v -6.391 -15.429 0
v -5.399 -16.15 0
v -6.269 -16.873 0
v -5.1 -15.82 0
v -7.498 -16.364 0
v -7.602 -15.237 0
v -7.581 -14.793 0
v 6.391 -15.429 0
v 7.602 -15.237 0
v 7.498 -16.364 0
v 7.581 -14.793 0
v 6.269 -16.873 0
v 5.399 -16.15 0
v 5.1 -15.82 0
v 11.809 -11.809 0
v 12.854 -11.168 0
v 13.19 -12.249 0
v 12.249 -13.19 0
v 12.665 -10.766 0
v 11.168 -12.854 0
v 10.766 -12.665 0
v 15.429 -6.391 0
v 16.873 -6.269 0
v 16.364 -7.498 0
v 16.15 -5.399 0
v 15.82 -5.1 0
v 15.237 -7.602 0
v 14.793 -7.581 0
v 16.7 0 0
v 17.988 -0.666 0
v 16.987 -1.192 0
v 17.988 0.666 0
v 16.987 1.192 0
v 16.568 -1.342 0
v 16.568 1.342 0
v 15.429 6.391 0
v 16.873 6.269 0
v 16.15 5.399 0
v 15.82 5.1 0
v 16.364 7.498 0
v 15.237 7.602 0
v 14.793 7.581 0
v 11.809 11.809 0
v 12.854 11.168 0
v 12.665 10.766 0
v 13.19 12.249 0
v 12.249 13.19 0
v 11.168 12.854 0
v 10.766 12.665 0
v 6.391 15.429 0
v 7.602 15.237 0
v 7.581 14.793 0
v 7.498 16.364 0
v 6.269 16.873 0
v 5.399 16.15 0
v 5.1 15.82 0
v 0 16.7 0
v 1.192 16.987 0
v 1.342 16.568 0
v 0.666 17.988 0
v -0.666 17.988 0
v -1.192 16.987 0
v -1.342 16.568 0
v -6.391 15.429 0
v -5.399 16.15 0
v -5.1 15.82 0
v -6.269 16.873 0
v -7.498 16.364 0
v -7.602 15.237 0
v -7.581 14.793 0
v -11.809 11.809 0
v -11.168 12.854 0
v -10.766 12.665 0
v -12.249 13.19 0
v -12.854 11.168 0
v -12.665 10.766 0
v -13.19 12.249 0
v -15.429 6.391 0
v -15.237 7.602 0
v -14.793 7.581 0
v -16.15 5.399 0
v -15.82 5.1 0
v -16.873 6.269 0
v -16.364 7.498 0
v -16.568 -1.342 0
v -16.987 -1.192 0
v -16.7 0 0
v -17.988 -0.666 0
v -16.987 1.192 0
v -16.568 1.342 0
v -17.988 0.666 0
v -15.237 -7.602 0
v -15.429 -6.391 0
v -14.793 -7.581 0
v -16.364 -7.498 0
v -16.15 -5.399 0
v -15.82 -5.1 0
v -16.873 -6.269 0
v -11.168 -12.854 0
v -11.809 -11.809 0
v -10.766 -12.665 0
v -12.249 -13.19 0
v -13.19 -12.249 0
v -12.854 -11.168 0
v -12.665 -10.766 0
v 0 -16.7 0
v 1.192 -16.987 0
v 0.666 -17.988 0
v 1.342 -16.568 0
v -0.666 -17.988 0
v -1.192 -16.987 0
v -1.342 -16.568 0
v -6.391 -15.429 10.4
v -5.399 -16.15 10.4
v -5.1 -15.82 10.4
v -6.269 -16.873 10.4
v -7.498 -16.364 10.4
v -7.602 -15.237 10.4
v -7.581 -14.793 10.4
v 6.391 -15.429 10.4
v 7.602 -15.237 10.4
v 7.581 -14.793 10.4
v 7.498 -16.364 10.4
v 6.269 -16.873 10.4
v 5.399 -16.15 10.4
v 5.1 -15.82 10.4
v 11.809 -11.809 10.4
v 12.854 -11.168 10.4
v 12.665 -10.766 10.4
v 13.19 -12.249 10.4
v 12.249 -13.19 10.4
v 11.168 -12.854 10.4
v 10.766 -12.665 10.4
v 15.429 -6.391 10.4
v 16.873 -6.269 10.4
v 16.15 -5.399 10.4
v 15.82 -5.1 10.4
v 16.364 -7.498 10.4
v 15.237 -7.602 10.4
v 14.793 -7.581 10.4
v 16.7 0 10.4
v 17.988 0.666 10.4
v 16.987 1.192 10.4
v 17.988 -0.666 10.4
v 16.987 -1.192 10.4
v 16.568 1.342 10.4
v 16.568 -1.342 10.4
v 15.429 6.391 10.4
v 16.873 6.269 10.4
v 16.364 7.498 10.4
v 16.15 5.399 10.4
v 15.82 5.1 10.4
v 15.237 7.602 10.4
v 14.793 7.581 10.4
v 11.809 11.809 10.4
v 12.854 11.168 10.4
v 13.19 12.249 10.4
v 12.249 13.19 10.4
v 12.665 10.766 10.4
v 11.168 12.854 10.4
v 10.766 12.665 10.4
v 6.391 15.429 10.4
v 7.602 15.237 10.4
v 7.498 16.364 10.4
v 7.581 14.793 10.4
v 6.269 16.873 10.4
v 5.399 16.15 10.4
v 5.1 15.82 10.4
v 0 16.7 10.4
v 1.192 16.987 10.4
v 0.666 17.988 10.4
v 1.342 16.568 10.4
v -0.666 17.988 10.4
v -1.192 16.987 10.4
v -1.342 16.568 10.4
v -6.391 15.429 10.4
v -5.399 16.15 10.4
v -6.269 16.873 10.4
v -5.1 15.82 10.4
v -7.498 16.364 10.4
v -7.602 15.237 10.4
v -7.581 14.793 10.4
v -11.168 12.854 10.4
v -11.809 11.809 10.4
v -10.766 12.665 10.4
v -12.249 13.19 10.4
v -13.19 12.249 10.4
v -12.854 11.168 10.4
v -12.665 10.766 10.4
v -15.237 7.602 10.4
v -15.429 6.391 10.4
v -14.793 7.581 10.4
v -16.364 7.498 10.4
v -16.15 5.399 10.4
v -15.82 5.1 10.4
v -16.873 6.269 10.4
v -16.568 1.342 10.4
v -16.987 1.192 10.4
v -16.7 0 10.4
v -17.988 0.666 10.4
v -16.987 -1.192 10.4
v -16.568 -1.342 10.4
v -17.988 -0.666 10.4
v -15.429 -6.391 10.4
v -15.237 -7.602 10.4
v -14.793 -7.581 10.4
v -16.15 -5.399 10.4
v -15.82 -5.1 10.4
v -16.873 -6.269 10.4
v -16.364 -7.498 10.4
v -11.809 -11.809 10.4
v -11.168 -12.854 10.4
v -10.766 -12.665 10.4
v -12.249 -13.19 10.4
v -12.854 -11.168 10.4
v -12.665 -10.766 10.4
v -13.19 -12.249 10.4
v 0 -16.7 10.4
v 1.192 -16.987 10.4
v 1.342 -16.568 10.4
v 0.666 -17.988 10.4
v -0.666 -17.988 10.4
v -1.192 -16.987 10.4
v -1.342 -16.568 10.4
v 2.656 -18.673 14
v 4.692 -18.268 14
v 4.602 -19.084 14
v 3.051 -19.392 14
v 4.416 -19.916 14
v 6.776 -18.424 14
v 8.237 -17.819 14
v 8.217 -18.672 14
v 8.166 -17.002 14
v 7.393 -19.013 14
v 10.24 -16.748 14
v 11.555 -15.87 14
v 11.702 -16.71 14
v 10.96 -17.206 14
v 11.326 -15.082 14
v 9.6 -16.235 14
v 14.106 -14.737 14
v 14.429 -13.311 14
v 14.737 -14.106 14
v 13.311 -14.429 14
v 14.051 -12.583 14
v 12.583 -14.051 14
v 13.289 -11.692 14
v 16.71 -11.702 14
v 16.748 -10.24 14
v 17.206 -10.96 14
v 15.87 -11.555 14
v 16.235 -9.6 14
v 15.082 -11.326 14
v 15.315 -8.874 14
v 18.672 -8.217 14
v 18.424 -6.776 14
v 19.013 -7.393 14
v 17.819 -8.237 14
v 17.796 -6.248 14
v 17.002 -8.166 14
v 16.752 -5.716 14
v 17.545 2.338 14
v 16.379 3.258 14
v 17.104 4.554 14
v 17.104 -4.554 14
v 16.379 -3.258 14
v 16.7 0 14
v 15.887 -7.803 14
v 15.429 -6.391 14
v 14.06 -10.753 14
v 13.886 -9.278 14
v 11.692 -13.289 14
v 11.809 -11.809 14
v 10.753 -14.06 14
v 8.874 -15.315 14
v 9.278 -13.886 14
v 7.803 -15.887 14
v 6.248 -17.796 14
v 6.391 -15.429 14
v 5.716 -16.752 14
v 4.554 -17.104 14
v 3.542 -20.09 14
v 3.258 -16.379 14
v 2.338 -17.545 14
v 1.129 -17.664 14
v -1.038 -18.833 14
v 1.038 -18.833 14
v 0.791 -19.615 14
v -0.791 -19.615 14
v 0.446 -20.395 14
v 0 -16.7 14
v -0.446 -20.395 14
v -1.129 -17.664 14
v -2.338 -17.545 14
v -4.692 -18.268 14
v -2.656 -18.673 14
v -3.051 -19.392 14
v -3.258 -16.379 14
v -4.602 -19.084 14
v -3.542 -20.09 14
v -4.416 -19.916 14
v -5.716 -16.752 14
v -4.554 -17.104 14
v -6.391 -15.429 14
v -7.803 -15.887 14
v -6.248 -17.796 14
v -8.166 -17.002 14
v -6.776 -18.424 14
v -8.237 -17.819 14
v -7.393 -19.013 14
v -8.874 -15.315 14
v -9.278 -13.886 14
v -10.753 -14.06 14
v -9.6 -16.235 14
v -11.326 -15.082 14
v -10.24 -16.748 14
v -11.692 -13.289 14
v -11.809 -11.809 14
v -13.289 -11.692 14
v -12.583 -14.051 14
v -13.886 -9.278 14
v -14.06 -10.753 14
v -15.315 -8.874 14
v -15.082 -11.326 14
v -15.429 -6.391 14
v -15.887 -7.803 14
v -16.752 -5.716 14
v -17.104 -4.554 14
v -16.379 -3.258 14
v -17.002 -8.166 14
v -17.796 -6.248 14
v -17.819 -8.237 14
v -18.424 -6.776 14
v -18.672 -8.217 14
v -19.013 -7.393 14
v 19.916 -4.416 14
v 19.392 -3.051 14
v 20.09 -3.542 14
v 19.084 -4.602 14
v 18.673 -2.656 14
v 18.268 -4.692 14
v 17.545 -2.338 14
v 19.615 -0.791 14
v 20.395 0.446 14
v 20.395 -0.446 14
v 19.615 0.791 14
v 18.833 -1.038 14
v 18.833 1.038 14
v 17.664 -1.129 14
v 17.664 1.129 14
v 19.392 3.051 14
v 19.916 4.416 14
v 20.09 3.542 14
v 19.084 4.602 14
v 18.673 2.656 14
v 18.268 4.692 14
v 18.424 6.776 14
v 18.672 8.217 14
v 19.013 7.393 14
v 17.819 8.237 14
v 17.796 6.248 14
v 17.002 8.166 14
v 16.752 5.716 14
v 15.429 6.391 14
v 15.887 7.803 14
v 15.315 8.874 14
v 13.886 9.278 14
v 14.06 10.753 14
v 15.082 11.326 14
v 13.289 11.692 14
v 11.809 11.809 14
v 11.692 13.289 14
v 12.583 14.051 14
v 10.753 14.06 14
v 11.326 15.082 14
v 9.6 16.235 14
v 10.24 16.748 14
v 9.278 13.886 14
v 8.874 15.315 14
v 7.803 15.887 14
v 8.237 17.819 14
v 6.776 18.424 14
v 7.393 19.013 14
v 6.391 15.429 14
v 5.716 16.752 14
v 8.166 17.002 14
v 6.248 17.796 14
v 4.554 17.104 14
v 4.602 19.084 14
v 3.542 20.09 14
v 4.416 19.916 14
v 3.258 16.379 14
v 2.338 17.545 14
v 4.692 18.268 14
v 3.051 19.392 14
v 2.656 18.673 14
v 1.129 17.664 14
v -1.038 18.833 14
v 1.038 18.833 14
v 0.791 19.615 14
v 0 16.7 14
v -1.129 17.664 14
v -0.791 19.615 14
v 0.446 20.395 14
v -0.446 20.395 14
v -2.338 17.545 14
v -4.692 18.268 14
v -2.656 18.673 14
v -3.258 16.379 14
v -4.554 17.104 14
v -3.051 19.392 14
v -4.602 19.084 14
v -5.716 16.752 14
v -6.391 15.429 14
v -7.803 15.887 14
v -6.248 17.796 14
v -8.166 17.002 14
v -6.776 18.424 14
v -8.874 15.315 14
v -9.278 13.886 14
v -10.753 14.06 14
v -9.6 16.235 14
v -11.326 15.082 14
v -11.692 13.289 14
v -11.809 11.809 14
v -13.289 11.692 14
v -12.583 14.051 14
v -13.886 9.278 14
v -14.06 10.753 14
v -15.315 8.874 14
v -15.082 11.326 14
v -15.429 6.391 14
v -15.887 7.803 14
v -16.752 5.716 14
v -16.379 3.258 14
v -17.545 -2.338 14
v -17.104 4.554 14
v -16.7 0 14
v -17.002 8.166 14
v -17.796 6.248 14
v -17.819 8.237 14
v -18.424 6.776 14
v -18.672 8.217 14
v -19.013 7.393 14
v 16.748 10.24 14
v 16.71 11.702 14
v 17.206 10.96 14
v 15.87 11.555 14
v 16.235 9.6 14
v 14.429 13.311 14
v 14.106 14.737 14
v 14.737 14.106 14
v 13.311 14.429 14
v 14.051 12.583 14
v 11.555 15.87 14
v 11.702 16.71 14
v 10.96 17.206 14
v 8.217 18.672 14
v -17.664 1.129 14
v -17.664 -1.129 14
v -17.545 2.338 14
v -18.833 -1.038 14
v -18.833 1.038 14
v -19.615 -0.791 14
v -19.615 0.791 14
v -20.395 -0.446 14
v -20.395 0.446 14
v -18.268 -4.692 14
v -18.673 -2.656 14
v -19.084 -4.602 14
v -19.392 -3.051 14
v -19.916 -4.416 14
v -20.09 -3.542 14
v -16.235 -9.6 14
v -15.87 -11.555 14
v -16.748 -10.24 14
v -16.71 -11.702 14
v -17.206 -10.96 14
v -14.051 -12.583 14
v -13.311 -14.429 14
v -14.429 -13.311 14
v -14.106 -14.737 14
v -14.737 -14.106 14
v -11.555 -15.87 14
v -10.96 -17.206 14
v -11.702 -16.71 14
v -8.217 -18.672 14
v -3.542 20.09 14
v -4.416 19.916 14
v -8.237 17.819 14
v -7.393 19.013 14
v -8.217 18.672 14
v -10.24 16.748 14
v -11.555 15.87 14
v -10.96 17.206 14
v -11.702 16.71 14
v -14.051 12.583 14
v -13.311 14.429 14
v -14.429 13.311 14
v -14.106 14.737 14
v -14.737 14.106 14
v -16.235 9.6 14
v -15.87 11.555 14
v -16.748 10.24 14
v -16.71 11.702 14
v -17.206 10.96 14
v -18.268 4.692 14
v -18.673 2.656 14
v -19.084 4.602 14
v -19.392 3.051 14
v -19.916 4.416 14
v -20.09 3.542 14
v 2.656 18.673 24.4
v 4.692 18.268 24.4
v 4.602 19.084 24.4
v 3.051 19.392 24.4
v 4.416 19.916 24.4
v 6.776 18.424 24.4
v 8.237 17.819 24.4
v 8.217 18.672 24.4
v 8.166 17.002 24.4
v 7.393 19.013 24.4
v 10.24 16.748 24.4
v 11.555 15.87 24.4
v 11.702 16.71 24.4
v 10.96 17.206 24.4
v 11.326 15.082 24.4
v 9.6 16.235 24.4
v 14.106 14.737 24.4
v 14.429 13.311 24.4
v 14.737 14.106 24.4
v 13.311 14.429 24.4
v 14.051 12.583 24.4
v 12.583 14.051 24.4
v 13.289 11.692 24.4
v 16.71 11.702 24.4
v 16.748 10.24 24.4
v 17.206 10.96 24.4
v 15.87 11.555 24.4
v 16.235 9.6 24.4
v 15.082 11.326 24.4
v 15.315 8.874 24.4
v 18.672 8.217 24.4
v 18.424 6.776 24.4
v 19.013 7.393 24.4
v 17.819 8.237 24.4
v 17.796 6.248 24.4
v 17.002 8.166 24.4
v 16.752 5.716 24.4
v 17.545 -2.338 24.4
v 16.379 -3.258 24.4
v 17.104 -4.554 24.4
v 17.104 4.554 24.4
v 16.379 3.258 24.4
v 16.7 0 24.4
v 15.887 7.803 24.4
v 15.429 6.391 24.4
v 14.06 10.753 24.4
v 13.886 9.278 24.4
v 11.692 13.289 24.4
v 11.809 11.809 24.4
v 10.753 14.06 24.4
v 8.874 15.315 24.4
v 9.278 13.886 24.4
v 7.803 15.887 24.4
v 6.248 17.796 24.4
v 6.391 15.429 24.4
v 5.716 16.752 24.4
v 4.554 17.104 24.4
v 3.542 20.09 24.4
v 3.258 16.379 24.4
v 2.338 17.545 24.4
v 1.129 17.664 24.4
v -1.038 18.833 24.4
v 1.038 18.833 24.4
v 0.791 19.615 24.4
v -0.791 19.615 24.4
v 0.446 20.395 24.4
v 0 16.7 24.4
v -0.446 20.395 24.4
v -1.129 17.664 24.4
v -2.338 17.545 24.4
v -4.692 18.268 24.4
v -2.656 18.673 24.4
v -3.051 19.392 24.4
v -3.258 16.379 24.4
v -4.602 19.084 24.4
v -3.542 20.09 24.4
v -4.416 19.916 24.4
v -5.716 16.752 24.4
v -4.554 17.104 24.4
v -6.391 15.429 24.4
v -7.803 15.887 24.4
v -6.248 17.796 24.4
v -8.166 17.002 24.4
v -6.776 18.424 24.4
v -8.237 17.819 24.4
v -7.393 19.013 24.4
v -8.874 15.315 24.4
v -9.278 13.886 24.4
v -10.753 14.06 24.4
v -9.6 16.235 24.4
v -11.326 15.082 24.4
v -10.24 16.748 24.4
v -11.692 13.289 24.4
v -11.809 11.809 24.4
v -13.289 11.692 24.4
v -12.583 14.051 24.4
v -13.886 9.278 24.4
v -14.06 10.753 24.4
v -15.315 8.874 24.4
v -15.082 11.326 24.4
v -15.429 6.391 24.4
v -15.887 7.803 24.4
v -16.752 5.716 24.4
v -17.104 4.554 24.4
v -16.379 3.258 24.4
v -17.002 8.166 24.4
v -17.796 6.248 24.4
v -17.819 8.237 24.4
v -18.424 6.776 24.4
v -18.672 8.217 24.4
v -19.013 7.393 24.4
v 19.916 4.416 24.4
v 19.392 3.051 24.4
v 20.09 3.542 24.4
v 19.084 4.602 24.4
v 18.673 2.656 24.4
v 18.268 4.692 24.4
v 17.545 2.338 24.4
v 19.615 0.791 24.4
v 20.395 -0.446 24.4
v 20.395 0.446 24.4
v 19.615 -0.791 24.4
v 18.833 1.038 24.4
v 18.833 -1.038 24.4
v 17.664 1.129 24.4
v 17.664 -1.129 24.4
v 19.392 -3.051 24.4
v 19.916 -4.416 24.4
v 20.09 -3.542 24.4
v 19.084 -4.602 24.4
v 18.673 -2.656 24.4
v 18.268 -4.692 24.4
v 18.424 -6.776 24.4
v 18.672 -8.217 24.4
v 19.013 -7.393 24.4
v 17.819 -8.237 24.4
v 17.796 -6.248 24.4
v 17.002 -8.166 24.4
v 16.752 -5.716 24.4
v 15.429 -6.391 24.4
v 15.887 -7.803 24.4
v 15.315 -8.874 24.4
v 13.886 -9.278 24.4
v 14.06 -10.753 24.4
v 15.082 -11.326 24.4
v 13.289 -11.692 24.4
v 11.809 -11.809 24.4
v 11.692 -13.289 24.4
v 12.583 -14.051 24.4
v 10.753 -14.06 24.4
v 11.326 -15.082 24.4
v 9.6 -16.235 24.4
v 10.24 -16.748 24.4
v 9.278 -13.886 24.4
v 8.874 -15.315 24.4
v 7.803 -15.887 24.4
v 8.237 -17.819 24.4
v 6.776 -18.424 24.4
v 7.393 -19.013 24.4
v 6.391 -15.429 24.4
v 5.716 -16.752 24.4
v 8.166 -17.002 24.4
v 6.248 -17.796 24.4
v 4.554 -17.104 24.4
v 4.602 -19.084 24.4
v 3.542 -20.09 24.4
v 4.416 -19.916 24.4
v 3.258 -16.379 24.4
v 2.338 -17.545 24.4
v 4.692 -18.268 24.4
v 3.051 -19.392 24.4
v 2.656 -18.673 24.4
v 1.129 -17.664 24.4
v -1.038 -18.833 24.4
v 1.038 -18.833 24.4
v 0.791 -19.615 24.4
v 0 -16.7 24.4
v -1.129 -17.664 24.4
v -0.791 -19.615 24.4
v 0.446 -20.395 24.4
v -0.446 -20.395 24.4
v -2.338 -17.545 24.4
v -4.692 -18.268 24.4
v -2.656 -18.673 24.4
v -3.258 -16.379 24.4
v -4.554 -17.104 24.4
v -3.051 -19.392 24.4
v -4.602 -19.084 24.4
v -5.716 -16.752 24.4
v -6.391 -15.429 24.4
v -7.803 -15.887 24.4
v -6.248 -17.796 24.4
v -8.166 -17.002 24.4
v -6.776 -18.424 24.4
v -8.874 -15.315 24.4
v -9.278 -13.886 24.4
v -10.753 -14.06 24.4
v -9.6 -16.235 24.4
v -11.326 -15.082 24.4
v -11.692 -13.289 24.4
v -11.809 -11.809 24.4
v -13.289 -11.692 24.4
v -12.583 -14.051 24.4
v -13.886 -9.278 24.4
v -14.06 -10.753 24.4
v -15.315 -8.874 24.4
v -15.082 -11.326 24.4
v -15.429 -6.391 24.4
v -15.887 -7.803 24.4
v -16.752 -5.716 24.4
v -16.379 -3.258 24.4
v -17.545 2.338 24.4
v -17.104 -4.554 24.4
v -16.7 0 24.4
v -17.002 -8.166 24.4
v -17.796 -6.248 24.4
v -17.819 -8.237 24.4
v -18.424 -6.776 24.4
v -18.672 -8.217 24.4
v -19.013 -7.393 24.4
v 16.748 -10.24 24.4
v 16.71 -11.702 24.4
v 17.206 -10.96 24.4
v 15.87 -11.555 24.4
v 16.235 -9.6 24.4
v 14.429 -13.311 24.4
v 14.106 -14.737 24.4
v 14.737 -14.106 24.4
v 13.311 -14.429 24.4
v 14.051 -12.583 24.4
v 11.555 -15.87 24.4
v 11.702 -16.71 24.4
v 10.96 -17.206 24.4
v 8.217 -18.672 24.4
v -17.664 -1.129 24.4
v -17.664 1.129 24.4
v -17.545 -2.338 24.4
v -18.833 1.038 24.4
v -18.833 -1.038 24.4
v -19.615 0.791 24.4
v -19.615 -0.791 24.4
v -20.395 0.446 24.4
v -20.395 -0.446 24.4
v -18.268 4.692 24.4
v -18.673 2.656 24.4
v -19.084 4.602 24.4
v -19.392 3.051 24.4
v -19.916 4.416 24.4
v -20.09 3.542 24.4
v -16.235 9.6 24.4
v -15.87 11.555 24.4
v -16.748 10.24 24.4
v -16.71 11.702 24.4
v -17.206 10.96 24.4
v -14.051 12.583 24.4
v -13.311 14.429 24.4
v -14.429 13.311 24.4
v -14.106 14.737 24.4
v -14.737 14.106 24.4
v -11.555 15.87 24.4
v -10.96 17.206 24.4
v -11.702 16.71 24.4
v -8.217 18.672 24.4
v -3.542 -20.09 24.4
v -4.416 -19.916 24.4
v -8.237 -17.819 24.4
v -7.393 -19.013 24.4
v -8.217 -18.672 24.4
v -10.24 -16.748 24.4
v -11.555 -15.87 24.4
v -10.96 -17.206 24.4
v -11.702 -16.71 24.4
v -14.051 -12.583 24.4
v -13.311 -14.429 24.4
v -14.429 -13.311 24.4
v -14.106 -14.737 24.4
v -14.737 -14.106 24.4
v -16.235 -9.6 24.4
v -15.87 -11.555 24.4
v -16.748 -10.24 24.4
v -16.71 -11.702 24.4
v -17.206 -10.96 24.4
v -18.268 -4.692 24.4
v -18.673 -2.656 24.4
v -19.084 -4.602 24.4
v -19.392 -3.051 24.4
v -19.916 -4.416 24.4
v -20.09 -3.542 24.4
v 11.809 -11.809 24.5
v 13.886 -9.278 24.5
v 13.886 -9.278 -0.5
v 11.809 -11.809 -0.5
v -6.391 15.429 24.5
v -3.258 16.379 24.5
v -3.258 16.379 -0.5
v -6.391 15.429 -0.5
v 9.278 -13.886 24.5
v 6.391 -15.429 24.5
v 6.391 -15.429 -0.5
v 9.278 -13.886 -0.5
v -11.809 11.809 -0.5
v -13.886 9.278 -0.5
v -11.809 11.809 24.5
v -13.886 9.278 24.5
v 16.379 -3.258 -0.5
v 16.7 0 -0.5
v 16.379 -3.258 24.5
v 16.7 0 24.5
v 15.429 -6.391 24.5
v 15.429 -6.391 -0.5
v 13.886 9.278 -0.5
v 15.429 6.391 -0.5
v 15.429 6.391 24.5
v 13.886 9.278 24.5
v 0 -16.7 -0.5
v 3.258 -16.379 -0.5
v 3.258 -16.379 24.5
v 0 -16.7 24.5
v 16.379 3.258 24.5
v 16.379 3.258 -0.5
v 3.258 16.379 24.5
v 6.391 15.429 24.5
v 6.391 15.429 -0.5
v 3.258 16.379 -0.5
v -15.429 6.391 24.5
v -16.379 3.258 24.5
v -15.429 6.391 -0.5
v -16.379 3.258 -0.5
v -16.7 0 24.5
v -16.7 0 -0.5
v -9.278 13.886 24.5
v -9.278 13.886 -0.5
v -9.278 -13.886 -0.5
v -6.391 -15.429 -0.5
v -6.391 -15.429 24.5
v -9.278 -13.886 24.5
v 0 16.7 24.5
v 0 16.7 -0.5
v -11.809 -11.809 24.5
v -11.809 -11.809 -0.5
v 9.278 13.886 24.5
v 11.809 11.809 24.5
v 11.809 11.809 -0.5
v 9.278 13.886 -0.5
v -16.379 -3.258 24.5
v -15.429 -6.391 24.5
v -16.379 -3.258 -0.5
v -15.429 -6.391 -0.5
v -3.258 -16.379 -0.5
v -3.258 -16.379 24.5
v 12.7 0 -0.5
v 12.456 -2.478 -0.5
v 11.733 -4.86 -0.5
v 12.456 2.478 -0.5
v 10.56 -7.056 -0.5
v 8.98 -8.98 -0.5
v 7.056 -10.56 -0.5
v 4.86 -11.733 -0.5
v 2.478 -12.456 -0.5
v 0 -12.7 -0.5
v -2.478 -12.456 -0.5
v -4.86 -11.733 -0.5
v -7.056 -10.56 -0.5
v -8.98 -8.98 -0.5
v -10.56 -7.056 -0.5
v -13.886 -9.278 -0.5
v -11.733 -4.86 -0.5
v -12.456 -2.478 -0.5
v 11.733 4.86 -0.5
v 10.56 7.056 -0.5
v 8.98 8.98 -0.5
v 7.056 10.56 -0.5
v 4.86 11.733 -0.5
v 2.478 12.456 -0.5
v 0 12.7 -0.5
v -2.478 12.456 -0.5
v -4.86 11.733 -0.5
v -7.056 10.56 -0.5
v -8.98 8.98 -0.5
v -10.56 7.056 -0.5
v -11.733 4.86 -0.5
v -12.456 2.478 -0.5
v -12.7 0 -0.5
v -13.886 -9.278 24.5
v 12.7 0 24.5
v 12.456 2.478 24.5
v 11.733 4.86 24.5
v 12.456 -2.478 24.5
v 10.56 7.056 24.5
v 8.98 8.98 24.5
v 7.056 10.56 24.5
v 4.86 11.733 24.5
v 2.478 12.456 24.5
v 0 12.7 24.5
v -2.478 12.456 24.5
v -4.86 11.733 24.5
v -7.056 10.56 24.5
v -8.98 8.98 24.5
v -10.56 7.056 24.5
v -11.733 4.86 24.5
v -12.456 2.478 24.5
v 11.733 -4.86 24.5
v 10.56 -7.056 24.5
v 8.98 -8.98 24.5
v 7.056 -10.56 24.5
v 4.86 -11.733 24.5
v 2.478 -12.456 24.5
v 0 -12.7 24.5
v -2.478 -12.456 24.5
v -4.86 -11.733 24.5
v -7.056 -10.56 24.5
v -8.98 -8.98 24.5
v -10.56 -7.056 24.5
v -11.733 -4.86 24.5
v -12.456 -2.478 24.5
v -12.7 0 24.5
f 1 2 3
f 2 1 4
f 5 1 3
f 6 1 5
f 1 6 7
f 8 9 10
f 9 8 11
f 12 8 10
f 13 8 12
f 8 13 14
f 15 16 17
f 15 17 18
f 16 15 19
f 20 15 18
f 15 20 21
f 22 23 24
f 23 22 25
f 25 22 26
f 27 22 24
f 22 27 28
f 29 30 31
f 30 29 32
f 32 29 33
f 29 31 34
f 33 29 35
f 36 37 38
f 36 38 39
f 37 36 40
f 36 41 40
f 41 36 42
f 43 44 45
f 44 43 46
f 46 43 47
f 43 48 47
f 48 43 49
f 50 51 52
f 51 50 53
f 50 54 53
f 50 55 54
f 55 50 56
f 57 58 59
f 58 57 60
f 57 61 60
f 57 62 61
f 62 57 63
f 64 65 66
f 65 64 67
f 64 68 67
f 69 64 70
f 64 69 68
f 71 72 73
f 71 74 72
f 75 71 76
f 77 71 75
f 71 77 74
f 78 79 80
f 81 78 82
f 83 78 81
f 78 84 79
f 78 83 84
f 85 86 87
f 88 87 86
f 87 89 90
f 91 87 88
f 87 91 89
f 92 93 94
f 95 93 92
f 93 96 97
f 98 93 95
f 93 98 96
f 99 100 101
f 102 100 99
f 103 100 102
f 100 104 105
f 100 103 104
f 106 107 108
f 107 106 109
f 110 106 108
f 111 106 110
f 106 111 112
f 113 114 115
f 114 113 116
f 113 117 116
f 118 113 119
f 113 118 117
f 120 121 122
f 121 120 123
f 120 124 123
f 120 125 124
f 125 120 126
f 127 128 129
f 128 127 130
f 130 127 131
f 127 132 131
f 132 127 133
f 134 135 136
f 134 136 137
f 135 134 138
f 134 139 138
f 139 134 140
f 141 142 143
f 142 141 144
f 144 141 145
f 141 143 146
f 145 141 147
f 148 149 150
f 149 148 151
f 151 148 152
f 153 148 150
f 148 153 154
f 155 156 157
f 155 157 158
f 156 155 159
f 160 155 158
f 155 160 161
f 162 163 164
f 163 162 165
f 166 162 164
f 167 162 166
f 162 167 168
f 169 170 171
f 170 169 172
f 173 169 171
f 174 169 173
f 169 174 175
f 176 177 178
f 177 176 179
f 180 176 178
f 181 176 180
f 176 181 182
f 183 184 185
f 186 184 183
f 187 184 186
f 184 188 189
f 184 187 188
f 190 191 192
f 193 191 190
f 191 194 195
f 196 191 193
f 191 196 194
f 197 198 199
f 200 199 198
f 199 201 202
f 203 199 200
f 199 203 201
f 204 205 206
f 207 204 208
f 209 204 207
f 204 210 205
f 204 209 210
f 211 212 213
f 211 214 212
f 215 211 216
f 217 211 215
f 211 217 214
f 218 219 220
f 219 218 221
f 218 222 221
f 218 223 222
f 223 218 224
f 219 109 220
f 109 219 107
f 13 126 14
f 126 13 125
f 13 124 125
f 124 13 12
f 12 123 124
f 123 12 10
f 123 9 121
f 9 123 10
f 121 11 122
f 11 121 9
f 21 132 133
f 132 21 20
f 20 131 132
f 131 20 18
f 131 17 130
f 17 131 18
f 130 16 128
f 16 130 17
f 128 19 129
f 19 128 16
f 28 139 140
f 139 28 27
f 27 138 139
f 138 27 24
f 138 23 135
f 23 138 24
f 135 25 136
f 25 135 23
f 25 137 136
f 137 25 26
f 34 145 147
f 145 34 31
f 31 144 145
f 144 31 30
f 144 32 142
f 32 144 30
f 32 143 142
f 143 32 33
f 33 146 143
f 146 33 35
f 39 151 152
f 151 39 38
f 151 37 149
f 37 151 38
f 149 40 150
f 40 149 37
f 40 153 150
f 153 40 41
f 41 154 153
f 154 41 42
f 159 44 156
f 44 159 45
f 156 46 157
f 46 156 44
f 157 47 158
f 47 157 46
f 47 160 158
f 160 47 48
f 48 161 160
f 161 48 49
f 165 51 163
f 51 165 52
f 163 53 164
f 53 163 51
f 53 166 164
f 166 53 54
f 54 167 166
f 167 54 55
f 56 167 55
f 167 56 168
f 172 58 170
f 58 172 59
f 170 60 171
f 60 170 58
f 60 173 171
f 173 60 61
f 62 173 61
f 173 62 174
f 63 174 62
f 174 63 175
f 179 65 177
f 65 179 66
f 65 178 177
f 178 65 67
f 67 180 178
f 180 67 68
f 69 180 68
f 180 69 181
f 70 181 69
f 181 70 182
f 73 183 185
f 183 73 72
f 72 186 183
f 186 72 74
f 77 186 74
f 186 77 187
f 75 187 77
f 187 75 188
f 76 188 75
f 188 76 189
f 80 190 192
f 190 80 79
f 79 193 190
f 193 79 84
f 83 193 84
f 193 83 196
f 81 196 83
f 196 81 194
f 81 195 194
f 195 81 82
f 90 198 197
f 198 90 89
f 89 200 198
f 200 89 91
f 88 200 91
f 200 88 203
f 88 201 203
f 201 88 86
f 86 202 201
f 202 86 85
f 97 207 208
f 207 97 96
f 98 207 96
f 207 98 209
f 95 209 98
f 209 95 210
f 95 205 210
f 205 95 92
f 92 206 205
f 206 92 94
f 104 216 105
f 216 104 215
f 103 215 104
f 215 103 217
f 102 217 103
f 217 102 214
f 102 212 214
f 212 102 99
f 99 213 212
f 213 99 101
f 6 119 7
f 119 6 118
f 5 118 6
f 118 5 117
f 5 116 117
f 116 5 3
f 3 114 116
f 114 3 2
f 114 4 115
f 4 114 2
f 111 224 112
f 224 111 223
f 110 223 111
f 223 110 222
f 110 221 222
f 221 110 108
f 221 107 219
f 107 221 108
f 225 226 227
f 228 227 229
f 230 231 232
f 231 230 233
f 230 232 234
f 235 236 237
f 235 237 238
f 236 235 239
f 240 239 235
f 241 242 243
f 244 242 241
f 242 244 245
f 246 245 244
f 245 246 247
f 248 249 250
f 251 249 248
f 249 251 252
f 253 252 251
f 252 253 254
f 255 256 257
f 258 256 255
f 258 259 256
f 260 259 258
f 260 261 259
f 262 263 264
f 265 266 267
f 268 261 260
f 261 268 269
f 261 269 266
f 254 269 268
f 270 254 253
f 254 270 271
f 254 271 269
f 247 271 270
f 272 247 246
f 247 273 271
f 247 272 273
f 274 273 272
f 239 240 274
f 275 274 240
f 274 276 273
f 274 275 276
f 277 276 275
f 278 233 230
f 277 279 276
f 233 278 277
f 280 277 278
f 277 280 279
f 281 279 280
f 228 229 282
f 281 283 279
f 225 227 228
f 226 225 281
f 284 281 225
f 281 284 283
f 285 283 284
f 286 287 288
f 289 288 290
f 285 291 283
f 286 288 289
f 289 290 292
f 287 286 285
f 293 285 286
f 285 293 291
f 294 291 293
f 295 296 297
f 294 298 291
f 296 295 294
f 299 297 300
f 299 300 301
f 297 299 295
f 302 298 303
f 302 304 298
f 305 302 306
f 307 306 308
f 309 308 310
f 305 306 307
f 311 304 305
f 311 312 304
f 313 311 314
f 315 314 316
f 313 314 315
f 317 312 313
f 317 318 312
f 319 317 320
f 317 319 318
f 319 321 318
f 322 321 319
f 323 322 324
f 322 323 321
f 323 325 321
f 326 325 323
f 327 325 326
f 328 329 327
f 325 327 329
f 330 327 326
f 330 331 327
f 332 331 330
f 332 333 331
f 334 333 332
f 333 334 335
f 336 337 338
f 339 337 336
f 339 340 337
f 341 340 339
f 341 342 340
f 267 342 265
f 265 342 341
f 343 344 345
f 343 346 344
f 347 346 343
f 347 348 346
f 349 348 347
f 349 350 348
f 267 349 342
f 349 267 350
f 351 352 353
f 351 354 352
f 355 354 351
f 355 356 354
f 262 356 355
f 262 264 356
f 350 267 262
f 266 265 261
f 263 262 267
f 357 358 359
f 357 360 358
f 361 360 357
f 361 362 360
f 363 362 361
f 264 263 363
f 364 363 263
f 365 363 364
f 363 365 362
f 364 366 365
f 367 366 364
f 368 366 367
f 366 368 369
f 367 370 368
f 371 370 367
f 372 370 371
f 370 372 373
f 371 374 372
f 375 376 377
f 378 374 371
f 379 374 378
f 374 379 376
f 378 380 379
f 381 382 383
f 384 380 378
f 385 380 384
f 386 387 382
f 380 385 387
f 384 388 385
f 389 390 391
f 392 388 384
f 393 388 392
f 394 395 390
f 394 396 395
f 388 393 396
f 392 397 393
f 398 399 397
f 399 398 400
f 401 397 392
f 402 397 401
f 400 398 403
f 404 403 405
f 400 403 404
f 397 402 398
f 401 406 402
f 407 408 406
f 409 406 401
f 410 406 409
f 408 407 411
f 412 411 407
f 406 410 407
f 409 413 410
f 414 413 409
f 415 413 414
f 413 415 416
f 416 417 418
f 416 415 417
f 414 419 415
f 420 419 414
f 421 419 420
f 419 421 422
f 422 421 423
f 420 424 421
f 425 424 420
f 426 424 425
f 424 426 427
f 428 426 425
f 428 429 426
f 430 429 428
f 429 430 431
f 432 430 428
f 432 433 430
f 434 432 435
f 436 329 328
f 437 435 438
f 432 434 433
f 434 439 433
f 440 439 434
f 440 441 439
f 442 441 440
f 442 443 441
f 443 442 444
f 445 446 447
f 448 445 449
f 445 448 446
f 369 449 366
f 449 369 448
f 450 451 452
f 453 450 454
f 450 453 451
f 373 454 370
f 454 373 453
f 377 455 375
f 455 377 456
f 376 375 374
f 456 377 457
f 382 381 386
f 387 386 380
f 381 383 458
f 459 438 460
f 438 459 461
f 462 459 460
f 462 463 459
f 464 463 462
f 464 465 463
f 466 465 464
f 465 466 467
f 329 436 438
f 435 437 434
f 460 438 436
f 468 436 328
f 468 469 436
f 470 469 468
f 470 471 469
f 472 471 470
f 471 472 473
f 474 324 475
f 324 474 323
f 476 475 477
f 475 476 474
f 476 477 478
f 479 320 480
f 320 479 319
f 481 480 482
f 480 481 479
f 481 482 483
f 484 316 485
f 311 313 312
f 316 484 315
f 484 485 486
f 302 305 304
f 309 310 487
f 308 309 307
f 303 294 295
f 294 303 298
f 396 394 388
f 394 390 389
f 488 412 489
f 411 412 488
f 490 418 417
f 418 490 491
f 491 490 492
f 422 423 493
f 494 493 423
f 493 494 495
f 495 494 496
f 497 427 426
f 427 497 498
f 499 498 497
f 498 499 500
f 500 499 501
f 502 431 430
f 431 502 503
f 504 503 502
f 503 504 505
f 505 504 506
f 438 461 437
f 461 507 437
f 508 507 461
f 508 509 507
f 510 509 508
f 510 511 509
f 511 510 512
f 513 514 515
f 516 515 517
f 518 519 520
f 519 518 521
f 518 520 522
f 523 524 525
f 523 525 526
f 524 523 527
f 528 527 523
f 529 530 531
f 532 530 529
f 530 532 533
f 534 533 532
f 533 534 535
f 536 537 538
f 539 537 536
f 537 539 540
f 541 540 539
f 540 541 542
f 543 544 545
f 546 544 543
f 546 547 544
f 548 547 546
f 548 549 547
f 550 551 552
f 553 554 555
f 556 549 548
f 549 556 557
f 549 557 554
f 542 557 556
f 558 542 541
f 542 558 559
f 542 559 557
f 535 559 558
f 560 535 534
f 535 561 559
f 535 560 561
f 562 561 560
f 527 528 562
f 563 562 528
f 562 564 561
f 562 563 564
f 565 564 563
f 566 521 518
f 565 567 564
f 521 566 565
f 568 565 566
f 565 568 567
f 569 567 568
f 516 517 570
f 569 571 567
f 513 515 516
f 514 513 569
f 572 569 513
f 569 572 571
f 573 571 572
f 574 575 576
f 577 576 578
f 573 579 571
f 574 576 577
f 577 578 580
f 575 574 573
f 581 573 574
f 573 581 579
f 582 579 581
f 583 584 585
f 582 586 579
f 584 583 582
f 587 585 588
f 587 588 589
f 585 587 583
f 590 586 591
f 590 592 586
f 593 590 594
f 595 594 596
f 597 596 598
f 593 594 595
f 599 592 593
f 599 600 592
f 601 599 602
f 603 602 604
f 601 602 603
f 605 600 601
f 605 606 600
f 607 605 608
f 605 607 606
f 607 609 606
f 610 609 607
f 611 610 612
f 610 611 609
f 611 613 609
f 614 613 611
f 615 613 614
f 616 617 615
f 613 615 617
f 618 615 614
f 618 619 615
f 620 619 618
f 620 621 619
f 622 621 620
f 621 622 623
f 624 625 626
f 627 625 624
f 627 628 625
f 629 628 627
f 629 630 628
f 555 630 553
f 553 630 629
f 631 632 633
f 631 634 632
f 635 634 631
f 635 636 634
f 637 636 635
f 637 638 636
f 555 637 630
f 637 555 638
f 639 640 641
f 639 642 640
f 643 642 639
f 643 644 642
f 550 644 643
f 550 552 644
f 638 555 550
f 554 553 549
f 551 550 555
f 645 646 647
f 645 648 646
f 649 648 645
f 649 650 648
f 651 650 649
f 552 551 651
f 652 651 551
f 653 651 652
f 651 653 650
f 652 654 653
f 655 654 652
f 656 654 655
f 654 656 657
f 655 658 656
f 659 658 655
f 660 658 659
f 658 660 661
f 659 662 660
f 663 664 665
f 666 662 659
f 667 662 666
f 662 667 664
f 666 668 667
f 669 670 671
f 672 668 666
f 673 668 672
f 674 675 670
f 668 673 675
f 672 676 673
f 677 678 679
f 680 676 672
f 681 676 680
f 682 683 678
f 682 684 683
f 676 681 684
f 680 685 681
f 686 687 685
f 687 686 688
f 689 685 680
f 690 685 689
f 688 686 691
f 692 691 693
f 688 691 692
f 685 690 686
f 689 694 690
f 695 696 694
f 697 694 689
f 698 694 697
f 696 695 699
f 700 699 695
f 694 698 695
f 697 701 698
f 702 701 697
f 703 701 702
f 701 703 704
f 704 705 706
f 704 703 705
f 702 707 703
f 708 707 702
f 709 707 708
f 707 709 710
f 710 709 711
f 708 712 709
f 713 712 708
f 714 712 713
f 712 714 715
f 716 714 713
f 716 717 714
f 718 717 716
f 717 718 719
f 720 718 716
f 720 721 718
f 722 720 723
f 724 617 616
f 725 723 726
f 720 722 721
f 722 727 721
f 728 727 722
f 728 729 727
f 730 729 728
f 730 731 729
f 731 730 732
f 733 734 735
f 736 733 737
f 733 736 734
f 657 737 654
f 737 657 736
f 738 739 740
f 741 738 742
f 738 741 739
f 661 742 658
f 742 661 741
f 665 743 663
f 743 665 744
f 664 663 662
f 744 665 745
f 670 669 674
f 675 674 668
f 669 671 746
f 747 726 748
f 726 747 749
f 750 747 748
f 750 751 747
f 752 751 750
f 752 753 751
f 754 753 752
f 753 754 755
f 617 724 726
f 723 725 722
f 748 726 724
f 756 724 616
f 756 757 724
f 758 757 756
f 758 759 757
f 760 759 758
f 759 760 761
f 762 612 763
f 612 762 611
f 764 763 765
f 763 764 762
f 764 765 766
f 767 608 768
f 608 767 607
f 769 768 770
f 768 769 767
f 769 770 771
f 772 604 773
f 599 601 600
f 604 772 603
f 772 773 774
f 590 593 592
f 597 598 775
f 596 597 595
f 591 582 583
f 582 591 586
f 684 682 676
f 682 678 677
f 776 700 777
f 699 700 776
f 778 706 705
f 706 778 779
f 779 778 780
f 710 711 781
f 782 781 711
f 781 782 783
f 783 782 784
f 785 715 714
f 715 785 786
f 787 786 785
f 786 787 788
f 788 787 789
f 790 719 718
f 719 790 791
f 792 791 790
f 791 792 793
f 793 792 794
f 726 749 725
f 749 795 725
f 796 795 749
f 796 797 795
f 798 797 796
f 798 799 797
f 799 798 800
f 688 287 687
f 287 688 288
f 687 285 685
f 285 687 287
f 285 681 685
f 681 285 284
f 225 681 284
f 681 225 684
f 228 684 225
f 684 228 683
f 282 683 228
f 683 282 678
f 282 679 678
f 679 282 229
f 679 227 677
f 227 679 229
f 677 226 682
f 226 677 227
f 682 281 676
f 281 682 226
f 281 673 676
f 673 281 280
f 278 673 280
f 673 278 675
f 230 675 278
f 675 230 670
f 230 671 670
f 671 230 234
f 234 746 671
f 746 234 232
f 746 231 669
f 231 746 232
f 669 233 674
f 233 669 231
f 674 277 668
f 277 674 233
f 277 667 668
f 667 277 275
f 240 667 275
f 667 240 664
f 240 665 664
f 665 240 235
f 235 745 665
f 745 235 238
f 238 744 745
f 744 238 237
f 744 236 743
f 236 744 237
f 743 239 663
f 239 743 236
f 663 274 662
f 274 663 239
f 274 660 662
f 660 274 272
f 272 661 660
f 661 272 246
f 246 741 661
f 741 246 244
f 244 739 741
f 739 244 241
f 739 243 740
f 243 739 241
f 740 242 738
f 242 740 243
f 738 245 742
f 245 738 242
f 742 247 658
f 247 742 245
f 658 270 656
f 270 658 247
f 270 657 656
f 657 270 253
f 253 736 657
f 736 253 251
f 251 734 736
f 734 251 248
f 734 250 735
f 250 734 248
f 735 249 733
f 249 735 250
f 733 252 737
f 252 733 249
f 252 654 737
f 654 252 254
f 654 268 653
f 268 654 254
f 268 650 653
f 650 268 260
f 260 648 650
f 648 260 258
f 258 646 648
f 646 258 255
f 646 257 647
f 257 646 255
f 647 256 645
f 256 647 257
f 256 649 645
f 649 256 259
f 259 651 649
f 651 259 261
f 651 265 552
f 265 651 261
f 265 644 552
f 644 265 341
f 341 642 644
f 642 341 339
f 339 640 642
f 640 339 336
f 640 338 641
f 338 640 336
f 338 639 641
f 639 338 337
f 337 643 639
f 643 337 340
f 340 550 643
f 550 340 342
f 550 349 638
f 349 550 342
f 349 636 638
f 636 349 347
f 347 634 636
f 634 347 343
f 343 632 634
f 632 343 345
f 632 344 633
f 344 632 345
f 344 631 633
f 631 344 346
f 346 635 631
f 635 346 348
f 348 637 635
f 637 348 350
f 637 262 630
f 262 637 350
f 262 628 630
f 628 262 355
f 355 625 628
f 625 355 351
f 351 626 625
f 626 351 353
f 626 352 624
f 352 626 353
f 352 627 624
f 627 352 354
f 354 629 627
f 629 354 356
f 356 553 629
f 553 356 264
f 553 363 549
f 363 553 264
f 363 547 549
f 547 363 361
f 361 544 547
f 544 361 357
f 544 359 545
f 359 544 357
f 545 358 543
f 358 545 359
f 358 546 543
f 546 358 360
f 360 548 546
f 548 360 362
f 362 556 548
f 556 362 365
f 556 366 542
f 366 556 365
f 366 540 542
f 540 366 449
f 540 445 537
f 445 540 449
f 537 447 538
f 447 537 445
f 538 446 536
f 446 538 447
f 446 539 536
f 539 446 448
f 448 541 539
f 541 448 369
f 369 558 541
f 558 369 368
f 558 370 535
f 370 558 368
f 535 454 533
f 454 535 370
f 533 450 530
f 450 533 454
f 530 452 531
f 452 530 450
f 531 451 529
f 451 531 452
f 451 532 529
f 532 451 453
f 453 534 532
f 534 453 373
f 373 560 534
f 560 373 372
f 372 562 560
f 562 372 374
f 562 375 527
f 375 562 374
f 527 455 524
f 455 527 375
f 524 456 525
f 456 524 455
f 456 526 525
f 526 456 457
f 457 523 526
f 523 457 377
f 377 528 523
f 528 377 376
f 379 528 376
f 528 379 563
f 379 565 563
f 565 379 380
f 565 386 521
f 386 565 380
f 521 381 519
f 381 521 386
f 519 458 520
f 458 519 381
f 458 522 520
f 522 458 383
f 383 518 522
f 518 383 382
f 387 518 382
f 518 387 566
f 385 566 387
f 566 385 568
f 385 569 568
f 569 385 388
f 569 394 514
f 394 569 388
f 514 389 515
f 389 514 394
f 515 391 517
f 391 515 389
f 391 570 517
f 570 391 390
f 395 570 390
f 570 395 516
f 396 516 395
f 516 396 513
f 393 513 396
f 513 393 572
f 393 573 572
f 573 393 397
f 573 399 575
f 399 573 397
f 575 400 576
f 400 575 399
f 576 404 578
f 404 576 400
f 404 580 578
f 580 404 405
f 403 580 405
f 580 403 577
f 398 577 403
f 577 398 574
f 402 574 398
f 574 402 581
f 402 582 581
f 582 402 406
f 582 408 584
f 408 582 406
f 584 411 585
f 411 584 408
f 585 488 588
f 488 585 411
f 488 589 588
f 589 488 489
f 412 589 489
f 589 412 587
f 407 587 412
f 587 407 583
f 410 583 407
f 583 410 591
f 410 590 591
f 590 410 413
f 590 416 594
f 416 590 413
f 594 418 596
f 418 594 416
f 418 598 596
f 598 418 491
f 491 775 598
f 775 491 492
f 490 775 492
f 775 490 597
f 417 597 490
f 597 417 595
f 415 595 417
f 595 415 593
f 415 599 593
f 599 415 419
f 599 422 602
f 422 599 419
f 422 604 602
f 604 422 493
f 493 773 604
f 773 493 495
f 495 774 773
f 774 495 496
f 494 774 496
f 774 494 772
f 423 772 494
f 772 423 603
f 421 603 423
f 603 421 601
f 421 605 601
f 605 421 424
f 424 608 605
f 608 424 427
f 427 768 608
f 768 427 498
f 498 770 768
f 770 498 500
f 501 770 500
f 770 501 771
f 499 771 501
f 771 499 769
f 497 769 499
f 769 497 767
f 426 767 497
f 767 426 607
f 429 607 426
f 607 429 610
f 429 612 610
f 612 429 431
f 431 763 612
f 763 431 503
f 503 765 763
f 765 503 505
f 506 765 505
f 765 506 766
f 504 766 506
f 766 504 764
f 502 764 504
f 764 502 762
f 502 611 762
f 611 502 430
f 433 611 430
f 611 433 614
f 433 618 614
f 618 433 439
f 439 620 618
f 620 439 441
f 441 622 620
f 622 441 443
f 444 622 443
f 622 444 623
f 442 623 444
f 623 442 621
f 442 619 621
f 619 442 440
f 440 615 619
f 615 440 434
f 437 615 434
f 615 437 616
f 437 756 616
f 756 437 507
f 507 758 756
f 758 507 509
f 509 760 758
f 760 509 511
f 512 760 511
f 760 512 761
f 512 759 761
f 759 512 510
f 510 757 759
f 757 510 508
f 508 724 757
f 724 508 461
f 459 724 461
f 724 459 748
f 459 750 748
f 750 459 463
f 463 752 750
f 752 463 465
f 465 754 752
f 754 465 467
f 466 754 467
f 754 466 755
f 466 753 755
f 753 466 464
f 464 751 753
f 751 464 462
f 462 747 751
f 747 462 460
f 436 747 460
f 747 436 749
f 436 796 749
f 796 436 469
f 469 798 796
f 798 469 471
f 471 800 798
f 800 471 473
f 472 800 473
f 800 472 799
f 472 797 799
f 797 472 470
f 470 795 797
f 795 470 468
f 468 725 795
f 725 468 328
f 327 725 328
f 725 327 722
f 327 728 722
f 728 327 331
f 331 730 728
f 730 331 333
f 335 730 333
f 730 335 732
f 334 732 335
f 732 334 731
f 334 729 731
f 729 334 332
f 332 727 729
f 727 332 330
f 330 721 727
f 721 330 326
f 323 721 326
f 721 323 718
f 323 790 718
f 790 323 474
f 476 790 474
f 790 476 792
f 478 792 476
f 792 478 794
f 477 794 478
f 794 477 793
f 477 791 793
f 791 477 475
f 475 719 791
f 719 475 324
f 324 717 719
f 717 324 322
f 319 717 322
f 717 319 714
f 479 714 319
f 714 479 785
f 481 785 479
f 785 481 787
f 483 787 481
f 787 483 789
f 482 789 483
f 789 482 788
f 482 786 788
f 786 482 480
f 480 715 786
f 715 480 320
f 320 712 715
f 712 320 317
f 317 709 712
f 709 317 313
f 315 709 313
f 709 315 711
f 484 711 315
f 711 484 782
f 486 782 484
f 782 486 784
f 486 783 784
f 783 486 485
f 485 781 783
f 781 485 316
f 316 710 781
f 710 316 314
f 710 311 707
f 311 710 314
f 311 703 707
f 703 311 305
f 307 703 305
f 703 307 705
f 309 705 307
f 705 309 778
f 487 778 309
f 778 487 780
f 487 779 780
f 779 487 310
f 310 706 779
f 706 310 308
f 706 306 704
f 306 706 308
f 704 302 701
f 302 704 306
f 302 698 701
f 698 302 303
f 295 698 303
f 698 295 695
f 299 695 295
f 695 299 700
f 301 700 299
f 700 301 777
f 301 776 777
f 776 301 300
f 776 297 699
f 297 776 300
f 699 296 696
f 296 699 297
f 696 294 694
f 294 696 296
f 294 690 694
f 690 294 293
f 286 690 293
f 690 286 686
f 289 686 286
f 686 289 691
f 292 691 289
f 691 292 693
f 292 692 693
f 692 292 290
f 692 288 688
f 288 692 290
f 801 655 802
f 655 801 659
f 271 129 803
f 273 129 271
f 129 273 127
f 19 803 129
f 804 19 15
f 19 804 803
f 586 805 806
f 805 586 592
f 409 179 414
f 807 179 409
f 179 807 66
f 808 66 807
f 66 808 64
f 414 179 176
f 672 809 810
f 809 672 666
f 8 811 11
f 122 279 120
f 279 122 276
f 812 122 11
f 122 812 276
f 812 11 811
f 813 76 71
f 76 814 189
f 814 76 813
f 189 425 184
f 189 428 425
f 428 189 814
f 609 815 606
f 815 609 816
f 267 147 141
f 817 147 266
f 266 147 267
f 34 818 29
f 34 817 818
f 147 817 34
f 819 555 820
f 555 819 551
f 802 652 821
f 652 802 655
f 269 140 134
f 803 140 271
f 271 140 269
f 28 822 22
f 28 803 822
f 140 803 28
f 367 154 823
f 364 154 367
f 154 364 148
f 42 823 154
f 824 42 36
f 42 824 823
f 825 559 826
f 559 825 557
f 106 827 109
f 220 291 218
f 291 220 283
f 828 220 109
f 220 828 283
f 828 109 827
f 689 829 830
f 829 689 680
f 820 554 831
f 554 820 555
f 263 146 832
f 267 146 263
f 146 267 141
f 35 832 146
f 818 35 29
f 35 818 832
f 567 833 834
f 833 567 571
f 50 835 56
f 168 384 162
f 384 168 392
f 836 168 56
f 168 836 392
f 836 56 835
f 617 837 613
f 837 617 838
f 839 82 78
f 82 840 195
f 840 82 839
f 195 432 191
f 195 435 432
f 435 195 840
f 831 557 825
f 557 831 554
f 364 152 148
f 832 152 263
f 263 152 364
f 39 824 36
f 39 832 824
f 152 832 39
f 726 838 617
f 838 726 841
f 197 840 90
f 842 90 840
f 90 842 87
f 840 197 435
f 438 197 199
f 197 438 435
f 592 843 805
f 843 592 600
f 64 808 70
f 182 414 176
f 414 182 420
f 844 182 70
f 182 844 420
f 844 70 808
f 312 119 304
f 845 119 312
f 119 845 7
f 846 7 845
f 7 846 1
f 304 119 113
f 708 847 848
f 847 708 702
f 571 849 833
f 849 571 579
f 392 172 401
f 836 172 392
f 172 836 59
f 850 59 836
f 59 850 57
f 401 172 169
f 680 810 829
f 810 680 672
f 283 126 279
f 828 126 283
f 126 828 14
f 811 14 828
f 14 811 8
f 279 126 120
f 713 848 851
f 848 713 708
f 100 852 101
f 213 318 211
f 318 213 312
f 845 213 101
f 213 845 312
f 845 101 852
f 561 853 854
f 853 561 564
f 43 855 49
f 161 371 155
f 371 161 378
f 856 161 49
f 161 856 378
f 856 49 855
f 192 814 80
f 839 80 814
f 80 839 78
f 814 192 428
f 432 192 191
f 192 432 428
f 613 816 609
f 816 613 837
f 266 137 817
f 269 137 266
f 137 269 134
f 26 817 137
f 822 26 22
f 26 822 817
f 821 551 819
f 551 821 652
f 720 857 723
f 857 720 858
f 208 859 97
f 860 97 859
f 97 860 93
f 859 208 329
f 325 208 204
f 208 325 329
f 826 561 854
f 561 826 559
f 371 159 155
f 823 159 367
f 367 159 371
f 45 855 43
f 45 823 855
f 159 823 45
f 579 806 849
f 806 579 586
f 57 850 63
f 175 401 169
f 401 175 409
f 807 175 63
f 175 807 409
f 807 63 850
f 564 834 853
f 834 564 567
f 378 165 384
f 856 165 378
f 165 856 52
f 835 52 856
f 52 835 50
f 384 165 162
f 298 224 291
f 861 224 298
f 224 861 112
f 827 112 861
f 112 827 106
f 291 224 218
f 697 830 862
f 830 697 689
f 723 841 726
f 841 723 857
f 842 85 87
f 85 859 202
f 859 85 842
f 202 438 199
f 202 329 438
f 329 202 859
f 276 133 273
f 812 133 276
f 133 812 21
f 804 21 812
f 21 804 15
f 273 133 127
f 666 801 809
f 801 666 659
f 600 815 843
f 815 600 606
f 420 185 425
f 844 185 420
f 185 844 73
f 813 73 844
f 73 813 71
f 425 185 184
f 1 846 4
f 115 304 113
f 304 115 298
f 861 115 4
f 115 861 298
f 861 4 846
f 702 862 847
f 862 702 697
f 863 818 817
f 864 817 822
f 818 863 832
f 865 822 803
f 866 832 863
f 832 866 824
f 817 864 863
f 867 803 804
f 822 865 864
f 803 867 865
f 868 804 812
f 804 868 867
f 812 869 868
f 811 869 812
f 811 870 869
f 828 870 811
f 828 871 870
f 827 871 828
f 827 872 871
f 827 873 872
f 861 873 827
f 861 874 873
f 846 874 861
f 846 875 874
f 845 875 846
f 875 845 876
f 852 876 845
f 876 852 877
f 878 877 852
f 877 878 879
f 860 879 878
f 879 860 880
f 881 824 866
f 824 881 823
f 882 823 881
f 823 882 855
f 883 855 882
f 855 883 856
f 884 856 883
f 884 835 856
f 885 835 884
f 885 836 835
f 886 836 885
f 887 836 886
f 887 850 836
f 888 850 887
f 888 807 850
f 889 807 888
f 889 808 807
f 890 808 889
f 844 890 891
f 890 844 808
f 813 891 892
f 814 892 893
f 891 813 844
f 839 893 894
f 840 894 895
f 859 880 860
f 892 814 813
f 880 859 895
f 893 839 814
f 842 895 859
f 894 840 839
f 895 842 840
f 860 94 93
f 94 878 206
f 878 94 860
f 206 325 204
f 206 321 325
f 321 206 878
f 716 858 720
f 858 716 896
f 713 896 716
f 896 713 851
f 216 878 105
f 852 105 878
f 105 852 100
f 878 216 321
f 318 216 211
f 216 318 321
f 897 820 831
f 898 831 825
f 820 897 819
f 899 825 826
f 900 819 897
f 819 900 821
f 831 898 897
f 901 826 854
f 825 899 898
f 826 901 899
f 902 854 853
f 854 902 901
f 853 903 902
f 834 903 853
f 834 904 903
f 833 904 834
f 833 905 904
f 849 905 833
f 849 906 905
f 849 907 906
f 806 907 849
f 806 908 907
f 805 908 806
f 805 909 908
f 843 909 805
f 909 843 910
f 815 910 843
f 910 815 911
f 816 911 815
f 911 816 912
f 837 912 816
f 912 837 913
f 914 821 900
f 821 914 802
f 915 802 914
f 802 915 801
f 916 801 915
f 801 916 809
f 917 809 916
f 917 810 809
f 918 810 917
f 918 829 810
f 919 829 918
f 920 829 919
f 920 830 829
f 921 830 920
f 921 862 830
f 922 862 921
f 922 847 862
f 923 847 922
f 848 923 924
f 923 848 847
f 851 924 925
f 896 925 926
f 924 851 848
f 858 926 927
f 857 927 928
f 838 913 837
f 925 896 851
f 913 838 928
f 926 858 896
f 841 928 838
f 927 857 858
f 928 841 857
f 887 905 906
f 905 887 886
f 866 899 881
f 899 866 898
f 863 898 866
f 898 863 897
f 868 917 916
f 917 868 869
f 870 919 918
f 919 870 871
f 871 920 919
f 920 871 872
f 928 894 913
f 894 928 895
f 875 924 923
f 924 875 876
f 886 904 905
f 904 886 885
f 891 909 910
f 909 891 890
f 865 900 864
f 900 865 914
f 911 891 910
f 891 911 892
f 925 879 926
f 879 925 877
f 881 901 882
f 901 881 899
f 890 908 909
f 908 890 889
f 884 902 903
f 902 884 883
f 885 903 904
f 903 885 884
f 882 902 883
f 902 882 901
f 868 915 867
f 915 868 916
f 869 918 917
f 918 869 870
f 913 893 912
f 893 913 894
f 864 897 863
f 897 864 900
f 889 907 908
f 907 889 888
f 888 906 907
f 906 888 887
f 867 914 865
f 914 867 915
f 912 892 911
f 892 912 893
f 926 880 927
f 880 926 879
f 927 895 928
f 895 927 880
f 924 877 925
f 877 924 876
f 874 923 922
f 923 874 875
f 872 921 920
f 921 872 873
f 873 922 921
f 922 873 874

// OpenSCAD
$fn = 32;

// ----------------------------------------------------------------------
// Two-module gear rim: z16 m2 and z32 m1.2, 24 mm wide
// ----------------------------------------------------------------------

// --- parameters (mm) ---
module_a = 2;             // first tooth module
teeth_a = 16;             // first band tooth count
module_b = 1.2;           // second tooth module
teeth_b = 32;             // second band tooth count
band_h = 10;              // height of one tooth band
web_t = 4;                // web thickness between the bands
total = 24;               // overall width over both bands
root_r = 13.5;            // root radius of the coarse band
hub_r = 16.7;             // hub radius
bore_d = 25.4;            // hub bore
hole_count = 6;           // lightening holes
hole_r = 9.79;            // lightening hole circle radius
hole_d = 4;               // lightening hole diameter

band_a = [[13.414, -1.521], [15.981, -1.553], [16.987, -1.192], [17.988, -0.666], [17.988, 0.666], [16.987, 1.192], [15.981, 1.553], [13.414, 1.521], [12.975, 3.728], [15.359, 4.681], [16.15, 5.399], [16.873, 6.269], [16.364, 7.498], [15.237, 7.602], [14.171, 7.551], [11.811, 6.538], [10.561, 8.41], [12.399, 10.202], [12.854, 11.168], [13.19, 12.249], [12.249, 13.19], [11.168, 12.854], [10.202, 12.399], [8.41, 10.561], [6.538, 11.811], [7.551, 14.171], [7.602, 15.237], [7.498, 16.364], [6.269, 16.873], [5.399, 16.15], [4.681, 15.359], [3.728, 12.975], [1.521, 13.414], [1.553, 15.981], [1.192, 16.987], [0.666, 17.988], [-0.666, 17.988], [-1.192, 16.987], [-1.553, 15.981], [-1.521, 13.414], [-3.728, 12.975], [-4.681, 15.359], [-5.399, 16.15], [-6.269, 16.873], [-7.498, 16.364], [-7.602, 15.237], [-7.551, 14.171], [-6.538, 11.811], [-8.41, 10.561], [-10.202, 12.399], [-11.168, 12.854], [-12.249, 13.19], [-13.19, 12.249], [-12.854, 11.168], [-12.399, 10.202], [-10.561, 8.41], [-11.811, 6.538], [-14.171, 7.551], [-15.237, 7.602], [-16.364, 7.498], [-16.873, 6.269], [-16.15, 5.399], [-15.359, 4.681], [-12.975, 3.728], [-13.414, 1.521], [-15.981, 1.553], [-16.987, 1.192], [-17.988, 0.666], [-17.988, -0.666], [-16.987, -1.192], [-15.981, -1.553], [-13.414, -1.521], [-12.975, -3.728], [-15.359, -4.681], [-16.15, -5.399], [-16.873, -6.269], [-16.364, -7.498], [-15.237, -7.602], [-14.171, -7.551], [-11.811, -6.538], [-10.561, -8.41], [-12.399, -10.202], [-12.854, -11.168], [-13.19, -12.249], [-12.249, -13.19], [-11.168, -12.854], [-10.202, -12.399], [-8.41, -10.561], [-6.538, -11.811], [-7.551, -14.171], [-7.602, -15.237], [-7.498, -16.364], [-6.269, -16.873], [-5.399, -16.15], [-4.681, -15.359], [-3.728, -12.975], [-1.521, -13.414], [-1.553, -15.981], [-1.192, -16.987], [-0.666, -17.988], [0.666, -17.988], [1.192, -16.987], [1.553, -15.981], [1.521, -13.414], [3.728, -12.975], [4.681, -15.359], [5.399, -16.15], [6.269, -16.873], [7.498, -16.364], [7.602, -15.237], [7.551, -14.171], [6.538, -11.811], [8.41, -10.561], [10.202, -12.399], [11.168, -12.854], [12.249, -13.19], [13.19, -12.249], [12.854, -11.168], [12.399, -10.202], [10.561, -8.41], [11.811, -6.538], [14.171, -7.551], [15.237, -7.602], [16.364, -7.498], [16.873, -6.269], [16.15, -5.399], [15.359, -4.681], [12.975, -3.728]];
band_b = [[17.664, -1.129], [18.833, -1.038], [19.615, -0.791], [20.395, -0.446], [20.395, 0.446], [19.615, 0.791], [18.833, 1.038], [17.664, 1.129], [17.545, 2.338], [18.673, 2.656], [19.392, 3.051], [20.09, 3.542], [19.916, 4.416], [19.084, 4.602], [18.268, 4.692], [17.104, 4.554], [16.752, 5.716], [17.796, 6.248], [18.424, 6.776], [19.013, 7.393], [18.672, 8.217], [17.819, 8.237], [17.002, 8.166], [15.887, 7.803], [15.315, 8.874], [16.235, 9.6], [16.748, 10.24], [17.206, 10.96], [16.71, 11.702], [15.87, 11.555], [15.082, 11.326], [14.06, 10.753], [13.289, 11.692], [14.051, 12.583], [14.429, 13.311], [14.737, 14.106], [14.106, 14.737], [13.311, 14.429], [12.583, 14.051], [11.692, 13.289], [10.753, 14.06], [11.326, 15.082], [11.555, 15.87], [11.702, 16.71], [10.96, 17.206], [10.24, 16.748], [9.6, 16.235], [8.874, 15.315], [7.803, 15.887], [8.166, 17.002], [8.237, 17.819], [8.217, 18.672], [7.393, 19.013], [6.776, 18.424], [6.248, 17.796], [5.716, 16.752], [4.554, 17.104], [4.692, 18.268], [4.602, 19.084], [4.416, 19.916], [3.542, 20.09], [3.051, 19.392], [2.656, 18.673], [2.338, 17.545], [1.129, 17.664], [1.038, 18.833], [0.791, 19.615], [0.446, 20.395], [-0.446, 20.395], [-0.791, 19.615], [-1.038, 18.833], [-1.129, 17.664], [-2.338, 17.545], [-2.656, 18.673], [-3.051, 19.392], [-3.542, 20.09], [-4.416, 19.916], [-4.602, 19.084], [-4.692, 18.268], [-4.554, 17.104], [-5.716, 16.752], [-6.248, 17.796], [-6.776, 18.424], [-7.393, 19.013], [-8.217, 18.672], [-8.237, 17.819], [-8.166, 17.002], [-7.803, 15.887], [-8.874, 15.315], [-9.6, 16.235], [-10.24, 16.748], [-10.96, 17.206], [-11.702, 16.71], [-11.555, 15.87], [-11.326, 15.082], [-10.753, 14.06], [-11.692, 13.289], [-12.583, 14.051], [-13.311, 14.429], [-14.106, 14.737], [-14.737, 14.106], [-14.429, 13.311], [-14.051, 12.583], [-13.289, 11.692], [-14.06, 10.753], [-15.082, 11.326], [-15.87, 11.555], [-16.71, 11.702], [-17.206, 10.96], [-16.748, 10.24], [-16.235, 9.6], [-15.315, 8.874], [-15.887, 7.803], [-17.002, 8.166], [-17.819, 8.237], [-18.672, 8.217], [-19.013, 7.393], [-18.424, 6.776], [-17.796, 6.248], [-16.752, 5.716], [-17.104, 4.554], [-18.268, 4.692], [-19.084, 4.602], [-19.916, 4.416], [-20.09, 3.542], [-19.392, 3.051], [-18.673, 2.656], [-17.545, 2.338], [-17.664, 1.129], [-18.833, 1.038], [-19.615, 0.791], [-20.395, 0.446], [-20.395, -0.446], [-19.615, -0.791], [-18.833, -1.038], [-17.664, -1.129], [-17.545, -2.338], [-18.673, -2.656], [-19.392, -3.051], [-20.09, -3.542], [-19.916, -4.416], [-19.084, -4.602], [-18.268, -4.692], [-17.104, -4.554], [-16.752, -5.716], [-17.796, -6.248], [-18.424, -6.776], [-19.013, -7.393], [-18.672, -8.217], [-17.819, -8.237], [-17.002, -8.166], [-15.887, -7.803], [-15.315, -8.874], [-16.235, -9.6], [-16.748, -10.24], [-17.206, -10.96], [-16.71, -11.702], [-15.87, -11.555], [-15.082, -11.326], [-14.06, -10.753], [-13.289, -11.692], [-14.051, -12.583], [-14.429, -13.311], [-14.737, -14.106], [-14.106, -14.737], [-13.311, -14.429], [-12.583, -14.051], [-11.692, -13.289], [-10.753, -14.06], [-11.326, -15.082], [-11.555, -15.87], [-11.702, -16.71], [-10.96, -17.206], [-10.24, -16.748], [-9.6, -16.235], [-8.874, -15.315], [-7.803, -15.887], [-8.166, -17.002], [-8.237, -17.819], [-8.217, -18.672], [-7.393, -19.013], [-6.776, -18.424], [-6.248, -17.796], [-5.716, -16.752], [-4.554, -17.104], [-4.692, -18.268], [-4.602, -19.084], [-4.416, -19.916], [-3.542, -20.09], [-3.051, -19.392], [-2.656, -18.673], [-2.338, -17.545], [-1.129, -17.664], [-1.038, -18.833], [-0.791, -19.615], [-0.446, -20.395], [0.446, -20.395], [0.791, -19.615], [1.038, -18.833], [1.129, -17.664], [2.338, -17.545], [2.656, -18.673], [3.051, -19.392], [3.542, -20.09], [4.416, -19.916], [4.602, -19.084], [4.692, -18.268], [4.554, -17.104], [5.716, -16.752], [6.248, -17.796], [6.776, -18.424], [7.393, -19.013], [8.217, -18.672], [8.237, -17.819], [8.166, -17.002], [7.803, -15.887], [8.874, -15.315], [9.6, -16.235], [10.24, -16.748], [10.96, -17.206], [11.702, -16.71], [11.555, -15.87], [11.326, -15.082], [10.753, -14.06], [11.692, -13.289], [12.583, -14.051], [13.311, -14.429], [14.106, -14.737], [14.737, -14.106], [14.429, -13.311], [14.051, -12.583], [13.289, -11.692], [14.06, -10.753], [15.082, -11.326], [15.87, -11.555], [16.71, -11.702], [17.206, -10.96], [16.748, -10.24], [16.235, -9.6], [15.315, -8.874], [15.887, -7.803], [17.002, -8.166], [17.819, -8.237], [18.672, -8.217], [19.013, -7.393], [18.424, -6.776], [17.796, -6.248], [16.752, -5.716], [17.104, -4.554], [18.268, -4.692], [19.084, -4.602], [19.916, -4.416], [20.09, -3.542], [19.392, -3.051], [18.673, -2.656], [17.545, -2.338]];

difference() {
  union() {
    /* tooth band A, overlapping the web by 0.4 mm */
    linear_extrude(height = band_h + 0.4) polygon(band_a);
    /* web */
    translate([0, 0, band_h - 0.4]) cylinder(h = web_t + 0.8, d = 2 * root_r);
    /* tooth band B */
    translate([0, 0, band_h + web_t]) linear_extrude(height = band_h + 0.4) polygon(band_b);
    /* hub */
    translate([0, 0, -0.5]) cylinder(h = total + 1.0, d = 2 * hub_r);
  }
  /* bore */
  translate([0, 0, -2.5]) cylinder(h = total + 5, d = bore_d);
  /* lightening holes through the web */
  for (i = [0 : hole_count - 1]) {
    a = i * 360 / hole_count;
    translate([hole_r * cos(a), hole_r * sin(a), -2.5]) cylinder(h = total + 5, d = hole_d);
  }
}
